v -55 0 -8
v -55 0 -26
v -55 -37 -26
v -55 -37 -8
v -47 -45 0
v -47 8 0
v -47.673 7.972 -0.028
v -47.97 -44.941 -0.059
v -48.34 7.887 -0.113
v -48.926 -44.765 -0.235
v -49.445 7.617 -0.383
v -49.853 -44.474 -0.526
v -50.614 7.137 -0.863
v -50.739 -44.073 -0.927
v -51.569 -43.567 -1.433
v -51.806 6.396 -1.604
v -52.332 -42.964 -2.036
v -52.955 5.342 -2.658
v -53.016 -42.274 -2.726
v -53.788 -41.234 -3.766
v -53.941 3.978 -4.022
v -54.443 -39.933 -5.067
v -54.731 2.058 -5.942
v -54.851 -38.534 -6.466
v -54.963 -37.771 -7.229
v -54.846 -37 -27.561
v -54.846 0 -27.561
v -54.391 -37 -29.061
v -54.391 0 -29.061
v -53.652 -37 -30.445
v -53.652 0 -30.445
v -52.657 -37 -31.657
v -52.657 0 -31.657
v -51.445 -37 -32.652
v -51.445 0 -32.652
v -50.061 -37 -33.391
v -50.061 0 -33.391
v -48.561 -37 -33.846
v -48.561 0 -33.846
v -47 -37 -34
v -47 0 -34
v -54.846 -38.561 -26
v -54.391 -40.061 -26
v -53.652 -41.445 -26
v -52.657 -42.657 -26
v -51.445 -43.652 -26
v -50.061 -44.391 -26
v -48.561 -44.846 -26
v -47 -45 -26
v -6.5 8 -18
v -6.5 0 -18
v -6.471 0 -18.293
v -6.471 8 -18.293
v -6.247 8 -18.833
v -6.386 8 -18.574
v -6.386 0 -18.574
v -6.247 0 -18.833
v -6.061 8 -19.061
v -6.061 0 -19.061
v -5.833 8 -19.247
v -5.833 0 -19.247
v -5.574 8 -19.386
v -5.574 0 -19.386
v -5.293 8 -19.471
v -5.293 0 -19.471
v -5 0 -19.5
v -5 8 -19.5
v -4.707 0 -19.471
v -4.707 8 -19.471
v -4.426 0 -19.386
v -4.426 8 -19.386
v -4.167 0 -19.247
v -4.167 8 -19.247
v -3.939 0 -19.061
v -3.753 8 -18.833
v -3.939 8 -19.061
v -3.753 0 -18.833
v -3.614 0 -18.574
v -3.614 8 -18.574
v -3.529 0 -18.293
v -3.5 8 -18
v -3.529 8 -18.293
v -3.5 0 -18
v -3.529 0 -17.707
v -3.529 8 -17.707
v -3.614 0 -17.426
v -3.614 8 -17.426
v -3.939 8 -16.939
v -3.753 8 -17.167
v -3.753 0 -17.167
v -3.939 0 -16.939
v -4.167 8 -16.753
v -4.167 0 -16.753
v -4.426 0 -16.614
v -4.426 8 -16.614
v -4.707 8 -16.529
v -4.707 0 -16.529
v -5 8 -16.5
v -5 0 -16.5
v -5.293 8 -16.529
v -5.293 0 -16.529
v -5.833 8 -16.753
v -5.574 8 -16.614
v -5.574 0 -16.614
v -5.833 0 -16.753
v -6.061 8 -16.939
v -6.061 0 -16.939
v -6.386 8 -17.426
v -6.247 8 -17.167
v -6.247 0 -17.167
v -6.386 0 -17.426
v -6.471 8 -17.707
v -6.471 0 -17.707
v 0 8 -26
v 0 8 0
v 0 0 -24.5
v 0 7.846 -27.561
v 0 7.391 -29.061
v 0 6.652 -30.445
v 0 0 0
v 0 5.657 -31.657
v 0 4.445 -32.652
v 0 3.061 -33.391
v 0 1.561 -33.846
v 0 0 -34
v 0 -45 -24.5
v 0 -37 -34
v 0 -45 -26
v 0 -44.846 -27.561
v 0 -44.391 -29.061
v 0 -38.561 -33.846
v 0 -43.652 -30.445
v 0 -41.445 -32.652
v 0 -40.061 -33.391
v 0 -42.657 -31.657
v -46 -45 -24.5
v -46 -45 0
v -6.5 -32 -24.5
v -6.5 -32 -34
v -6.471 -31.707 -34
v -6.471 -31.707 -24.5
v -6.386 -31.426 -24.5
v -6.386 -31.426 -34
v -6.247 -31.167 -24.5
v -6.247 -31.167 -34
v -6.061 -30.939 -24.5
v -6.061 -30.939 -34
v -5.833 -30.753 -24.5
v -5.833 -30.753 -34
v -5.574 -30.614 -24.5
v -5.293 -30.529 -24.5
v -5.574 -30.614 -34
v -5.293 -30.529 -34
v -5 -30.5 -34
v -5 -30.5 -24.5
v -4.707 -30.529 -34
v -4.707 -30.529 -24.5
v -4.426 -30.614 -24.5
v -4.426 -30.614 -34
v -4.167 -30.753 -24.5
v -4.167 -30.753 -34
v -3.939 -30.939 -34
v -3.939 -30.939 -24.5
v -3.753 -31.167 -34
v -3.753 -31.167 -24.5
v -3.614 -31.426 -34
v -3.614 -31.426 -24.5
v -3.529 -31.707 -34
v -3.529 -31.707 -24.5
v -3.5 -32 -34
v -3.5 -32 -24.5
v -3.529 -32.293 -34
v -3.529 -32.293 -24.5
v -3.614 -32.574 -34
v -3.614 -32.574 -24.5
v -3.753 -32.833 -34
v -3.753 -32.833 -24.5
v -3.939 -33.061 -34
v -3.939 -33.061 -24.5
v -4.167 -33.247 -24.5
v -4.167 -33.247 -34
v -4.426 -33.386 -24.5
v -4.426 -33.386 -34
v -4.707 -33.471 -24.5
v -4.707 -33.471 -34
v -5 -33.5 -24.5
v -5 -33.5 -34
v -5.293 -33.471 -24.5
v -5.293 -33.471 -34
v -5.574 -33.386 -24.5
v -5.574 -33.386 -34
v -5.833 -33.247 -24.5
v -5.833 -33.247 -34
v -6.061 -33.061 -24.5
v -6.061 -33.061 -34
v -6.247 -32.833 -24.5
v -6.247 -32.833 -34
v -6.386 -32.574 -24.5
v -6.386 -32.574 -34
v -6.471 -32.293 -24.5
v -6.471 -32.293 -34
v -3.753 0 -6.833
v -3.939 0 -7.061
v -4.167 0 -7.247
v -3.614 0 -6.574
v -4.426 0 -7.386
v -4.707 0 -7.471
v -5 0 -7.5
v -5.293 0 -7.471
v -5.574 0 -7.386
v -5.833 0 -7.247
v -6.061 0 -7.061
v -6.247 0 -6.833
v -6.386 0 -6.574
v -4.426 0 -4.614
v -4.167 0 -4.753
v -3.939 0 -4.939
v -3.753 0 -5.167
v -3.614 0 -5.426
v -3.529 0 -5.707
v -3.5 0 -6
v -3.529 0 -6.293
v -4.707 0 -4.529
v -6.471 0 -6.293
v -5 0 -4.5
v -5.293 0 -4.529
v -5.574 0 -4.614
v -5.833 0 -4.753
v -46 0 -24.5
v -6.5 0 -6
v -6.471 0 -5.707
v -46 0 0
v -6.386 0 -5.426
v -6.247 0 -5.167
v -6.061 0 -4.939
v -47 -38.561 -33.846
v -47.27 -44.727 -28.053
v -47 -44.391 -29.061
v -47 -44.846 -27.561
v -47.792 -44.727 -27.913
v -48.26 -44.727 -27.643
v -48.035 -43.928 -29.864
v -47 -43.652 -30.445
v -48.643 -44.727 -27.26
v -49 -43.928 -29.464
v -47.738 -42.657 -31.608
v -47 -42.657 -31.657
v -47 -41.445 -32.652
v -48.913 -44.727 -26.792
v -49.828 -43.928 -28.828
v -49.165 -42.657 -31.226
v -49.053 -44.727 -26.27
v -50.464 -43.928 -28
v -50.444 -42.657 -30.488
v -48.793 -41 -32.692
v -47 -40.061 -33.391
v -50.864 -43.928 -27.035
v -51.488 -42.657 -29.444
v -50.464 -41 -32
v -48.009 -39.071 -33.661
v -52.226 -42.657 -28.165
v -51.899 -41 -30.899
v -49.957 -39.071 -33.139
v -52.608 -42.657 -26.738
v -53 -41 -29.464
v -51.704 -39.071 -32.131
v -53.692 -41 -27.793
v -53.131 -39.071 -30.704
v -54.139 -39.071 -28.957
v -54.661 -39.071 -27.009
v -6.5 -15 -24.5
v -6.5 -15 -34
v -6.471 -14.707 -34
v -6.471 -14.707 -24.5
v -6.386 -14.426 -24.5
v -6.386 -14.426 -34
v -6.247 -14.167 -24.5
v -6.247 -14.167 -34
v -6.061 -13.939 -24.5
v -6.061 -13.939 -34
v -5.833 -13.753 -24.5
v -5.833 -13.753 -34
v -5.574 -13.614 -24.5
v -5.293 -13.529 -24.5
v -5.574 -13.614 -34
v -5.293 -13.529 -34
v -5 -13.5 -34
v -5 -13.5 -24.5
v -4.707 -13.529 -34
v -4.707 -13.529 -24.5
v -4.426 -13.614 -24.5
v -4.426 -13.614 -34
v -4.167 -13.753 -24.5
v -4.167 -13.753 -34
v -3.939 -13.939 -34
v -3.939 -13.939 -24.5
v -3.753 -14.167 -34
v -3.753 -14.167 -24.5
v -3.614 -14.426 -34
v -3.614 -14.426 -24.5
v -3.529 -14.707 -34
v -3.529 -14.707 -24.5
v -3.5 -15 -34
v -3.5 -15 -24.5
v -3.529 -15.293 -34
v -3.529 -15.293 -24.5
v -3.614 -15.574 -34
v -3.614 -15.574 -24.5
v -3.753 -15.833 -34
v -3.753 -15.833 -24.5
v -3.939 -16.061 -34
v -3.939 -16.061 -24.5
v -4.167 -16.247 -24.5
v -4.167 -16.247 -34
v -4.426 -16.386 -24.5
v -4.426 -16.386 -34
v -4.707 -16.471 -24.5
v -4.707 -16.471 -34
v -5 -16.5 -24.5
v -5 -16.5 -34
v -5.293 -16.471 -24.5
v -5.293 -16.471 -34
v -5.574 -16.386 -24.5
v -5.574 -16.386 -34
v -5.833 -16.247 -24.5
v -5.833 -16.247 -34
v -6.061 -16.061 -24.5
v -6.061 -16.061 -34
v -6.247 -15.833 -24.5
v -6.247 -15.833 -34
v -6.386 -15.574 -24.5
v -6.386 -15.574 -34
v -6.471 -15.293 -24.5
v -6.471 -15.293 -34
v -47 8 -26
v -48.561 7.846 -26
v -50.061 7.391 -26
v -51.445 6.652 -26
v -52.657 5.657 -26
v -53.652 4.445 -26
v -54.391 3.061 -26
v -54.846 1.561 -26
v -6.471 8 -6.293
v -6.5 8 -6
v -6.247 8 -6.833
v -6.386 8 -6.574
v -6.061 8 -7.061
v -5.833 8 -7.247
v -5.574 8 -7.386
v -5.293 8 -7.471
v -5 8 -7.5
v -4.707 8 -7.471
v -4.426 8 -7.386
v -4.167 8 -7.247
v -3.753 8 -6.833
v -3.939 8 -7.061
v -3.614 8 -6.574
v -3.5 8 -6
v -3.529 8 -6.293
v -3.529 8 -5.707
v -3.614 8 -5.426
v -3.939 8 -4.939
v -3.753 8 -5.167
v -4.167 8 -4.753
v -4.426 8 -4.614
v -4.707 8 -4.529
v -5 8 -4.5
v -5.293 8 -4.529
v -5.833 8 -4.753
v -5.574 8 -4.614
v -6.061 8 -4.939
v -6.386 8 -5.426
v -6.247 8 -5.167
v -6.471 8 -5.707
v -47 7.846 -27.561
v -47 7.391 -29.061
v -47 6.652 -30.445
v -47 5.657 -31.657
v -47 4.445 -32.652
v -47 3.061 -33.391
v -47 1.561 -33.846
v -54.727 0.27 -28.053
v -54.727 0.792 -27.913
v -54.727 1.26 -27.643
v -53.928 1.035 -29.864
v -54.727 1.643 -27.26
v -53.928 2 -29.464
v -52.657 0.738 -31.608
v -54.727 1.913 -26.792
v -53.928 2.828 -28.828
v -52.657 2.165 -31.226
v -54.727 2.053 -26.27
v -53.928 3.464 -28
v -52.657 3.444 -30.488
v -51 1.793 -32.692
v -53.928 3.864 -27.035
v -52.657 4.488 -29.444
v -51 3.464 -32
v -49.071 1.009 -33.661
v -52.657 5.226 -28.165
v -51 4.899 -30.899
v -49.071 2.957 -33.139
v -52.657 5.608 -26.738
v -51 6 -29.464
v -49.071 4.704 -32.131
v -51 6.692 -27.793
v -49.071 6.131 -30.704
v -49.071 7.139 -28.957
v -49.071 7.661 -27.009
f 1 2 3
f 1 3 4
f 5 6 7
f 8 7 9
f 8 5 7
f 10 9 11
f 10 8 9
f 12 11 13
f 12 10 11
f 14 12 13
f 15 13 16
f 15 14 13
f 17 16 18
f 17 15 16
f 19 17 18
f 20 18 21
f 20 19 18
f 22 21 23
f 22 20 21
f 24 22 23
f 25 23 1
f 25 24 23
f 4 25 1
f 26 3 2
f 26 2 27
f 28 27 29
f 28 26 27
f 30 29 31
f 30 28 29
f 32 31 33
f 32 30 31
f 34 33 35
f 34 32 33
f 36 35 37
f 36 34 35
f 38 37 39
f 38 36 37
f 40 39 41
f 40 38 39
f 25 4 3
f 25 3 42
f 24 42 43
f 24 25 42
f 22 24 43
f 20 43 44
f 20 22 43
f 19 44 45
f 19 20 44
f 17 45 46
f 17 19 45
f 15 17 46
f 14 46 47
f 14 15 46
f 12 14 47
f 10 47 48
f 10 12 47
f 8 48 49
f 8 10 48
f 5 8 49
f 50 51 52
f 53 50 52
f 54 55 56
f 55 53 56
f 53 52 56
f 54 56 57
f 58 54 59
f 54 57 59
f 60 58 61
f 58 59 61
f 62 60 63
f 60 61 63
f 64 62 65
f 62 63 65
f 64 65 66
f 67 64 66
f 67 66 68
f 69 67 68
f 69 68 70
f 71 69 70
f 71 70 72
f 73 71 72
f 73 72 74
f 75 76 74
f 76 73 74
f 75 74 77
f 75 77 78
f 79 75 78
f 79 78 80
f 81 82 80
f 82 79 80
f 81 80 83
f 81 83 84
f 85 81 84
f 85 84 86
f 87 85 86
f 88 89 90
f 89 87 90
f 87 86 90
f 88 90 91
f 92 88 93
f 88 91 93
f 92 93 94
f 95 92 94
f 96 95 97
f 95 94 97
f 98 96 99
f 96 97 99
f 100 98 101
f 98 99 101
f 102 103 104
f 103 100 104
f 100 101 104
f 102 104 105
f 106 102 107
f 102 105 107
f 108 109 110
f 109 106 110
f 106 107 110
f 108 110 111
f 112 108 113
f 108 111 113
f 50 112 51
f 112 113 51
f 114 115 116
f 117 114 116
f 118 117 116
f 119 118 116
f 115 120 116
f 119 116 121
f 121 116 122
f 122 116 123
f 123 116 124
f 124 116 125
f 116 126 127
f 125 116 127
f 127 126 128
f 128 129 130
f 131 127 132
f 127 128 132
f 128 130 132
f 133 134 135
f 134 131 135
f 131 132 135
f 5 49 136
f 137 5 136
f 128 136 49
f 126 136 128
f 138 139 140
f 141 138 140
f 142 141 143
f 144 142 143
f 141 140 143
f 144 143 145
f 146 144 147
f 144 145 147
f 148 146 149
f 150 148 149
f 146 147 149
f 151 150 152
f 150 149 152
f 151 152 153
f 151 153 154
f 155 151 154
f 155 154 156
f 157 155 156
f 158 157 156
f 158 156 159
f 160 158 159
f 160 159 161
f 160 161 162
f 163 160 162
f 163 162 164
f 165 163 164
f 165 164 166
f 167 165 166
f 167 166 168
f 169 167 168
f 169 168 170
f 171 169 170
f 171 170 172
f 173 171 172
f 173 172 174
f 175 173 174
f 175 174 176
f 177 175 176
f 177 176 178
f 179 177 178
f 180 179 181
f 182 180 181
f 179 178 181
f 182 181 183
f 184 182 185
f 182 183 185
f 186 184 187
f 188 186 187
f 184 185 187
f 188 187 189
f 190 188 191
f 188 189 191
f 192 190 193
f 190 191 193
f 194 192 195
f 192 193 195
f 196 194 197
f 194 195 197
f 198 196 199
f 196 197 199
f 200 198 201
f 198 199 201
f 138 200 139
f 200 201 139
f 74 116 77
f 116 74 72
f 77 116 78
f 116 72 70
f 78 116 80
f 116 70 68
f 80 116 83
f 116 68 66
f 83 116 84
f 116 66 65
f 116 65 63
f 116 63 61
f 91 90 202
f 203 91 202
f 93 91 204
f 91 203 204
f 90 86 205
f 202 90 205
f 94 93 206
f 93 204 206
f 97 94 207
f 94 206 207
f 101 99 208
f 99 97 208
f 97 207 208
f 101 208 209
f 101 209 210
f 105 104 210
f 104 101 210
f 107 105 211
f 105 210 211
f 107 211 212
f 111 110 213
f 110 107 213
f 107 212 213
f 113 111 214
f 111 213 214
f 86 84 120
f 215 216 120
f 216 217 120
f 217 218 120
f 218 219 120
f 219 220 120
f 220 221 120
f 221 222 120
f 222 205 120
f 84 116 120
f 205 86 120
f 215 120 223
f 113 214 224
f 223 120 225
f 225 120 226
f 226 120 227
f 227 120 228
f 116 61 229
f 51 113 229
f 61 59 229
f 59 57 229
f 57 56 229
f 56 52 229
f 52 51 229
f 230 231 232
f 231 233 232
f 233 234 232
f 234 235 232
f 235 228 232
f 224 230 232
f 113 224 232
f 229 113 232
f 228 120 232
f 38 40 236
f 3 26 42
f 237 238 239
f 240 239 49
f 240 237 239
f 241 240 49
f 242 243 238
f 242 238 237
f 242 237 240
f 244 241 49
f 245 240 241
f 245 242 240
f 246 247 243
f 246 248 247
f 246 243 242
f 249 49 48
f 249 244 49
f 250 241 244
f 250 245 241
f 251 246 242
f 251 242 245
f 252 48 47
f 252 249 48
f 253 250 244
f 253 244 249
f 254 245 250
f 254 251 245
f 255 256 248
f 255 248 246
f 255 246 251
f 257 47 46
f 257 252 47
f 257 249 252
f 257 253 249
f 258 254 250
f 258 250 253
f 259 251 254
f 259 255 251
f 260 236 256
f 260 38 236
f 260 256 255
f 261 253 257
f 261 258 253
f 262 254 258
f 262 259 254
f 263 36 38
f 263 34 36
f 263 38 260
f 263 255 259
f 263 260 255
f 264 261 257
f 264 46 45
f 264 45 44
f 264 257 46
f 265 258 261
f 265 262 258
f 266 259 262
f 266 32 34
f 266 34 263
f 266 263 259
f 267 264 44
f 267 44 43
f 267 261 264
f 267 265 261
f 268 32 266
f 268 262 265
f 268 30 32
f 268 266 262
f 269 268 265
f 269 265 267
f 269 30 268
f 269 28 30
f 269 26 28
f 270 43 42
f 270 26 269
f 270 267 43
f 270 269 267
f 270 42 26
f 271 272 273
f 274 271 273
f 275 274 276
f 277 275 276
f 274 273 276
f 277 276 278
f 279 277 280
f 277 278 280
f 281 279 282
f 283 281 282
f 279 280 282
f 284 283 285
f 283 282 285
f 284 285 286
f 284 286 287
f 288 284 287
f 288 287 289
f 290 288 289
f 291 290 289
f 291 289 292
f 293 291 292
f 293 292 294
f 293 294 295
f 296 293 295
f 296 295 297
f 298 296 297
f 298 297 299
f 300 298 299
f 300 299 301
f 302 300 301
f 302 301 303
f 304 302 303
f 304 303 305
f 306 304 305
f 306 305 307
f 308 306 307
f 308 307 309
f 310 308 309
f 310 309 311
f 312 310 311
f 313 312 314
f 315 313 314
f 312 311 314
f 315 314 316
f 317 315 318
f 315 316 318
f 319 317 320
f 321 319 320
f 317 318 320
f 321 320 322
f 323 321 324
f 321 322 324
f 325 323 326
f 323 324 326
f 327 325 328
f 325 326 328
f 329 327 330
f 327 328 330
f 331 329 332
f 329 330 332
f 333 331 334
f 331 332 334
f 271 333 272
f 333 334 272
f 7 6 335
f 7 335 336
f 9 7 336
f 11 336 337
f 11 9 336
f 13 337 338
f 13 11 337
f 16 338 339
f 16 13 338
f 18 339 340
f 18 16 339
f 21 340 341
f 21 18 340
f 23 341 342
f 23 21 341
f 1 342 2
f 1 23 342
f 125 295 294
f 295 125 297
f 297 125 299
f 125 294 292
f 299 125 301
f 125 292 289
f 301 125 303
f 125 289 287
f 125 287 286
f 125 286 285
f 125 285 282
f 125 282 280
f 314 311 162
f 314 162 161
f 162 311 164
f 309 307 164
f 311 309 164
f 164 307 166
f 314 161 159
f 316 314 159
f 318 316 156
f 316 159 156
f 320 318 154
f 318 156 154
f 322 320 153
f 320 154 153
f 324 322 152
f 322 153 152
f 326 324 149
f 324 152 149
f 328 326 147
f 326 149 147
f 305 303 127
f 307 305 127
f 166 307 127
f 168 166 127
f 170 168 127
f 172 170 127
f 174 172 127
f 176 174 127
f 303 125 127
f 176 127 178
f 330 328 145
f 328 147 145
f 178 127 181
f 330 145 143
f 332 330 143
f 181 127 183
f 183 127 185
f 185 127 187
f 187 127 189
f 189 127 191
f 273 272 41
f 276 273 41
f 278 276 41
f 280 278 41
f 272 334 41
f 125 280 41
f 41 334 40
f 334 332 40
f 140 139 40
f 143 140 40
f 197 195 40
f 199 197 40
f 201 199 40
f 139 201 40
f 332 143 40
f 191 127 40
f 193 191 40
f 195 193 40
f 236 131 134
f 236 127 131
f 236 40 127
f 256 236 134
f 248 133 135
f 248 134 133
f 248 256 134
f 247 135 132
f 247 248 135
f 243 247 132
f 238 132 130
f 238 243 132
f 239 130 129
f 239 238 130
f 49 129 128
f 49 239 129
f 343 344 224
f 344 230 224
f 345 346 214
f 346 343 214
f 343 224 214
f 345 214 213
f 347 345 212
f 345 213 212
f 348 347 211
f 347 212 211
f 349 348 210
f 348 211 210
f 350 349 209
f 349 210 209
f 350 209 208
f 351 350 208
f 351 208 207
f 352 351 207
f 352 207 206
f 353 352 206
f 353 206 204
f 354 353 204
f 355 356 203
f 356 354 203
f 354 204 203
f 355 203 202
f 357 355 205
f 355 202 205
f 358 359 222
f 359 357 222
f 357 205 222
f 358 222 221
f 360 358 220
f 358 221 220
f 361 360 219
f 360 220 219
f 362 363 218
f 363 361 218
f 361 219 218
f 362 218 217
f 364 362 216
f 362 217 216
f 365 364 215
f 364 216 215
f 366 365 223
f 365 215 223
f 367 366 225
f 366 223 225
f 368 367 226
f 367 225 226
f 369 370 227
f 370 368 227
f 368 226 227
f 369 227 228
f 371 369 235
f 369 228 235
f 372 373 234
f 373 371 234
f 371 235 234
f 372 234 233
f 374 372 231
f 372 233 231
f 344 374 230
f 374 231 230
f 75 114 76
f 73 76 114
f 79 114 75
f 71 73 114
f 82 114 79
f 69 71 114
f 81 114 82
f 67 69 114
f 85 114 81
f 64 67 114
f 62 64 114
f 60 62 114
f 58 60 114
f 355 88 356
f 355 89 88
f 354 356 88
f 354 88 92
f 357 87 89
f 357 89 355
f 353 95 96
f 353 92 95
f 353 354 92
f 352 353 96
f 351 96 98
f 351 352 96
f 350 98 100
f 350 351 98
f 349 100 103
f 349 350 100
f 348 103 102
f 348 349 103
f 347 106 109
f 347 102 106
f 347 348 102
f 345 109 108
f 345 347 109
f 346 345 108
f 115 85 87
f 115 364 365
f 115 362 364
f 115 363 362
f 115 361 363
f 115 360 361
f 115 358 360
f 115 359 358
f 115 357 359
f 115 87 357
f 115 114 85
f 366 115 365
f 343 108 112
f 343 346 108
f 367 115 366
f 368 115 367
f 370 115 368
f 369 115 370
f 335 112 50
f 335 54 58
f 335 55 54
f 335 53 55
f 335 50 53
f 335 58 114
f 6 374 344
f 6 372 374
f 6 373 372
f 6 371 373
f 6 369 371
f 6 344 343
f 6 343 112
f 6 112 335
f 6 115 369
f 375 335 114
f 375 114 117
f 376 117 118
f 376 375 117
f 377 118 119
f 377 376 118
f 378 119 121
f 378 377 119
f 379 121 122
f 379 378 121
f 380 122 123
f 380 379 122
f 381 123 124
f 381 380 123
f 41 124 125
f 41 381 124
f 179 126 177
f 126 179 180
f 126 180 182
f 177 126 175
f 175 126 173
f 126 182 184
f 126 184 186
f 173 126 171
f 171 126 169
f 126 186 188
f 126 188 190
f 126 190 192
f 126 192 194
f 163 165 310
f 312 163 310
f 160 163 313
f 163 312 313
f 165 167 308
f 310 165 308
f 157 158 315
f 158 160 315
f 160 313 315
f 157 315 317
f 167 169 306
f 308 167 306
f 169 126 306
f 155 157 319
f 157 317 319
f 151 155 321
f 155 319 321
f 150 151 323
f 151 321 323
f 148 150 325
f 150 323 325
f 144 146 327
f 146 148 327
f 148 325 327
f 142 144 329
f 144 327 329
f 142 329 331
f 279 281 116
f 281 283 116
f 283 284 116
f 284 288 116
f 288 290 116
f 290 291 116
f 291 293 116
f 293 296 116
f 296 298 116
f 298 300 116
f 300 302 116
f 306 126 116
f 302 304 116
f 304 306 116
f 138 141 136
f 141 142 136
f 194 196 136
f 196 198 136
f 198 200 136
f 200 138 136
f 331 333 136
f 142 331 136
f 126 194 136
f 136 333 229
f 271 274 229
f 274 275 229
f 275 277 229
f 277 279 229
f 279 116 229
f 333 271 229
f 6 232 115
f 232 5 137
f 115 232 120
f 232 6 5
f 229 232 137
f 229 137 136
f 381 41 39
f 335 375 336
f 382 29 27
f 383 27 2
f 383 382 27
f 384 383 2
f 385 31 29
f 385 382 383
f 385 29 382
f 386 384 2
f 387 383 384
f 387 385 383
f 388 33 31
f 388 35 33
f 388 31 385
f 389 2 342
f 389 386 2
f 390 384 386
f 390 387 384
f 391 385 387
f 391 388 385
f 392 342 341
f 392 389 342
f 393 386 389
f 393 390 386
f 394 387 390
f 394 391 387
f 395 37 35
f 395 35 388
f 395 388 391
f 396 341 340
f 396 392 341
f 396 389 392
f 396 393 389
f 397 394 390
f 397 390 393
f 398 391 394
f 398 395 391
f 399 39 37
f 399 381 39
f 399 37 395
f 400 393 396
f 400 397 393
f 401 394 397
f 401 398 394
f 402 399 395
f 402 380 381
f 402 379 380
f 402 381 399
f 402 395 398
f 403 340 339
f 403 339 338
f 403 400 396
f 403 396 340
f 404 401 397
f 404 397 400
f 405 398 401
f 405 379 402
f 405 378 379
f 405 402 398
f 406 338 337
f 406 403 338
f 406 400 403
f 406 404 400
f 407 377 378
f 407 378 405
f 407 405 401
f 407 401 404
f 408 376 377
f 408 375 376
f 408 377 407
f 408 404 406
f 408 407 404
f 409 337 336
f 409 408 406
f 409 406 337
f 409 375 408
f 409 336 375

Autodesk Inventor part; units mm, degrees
ref_plane "YZ Plane" through (0, 0, 0) normal (1, 0, 0) x (0, 1, 0)
ref_plane "XZ Plane" through (0, 0, 0) normal (0, 1, 0) x (-1, 0, 0)
ref_plane "XY Plane" through (0, 0, 0) normal (0, 0, 1) x (1, 0, 0)
sketch "Boceto1" plane through (0, 0, 0) normal (0, 1, 0) x (-1, 0, 0)
  line L0 (0, 0) -> (0, -24)
  line L1 (10, 0) -> (0, 0)
  line L2 (55, -24) -> (55, 0)
  line L3 (55, 0) -> (10, 0)
  line L4 (0, -24) -> (0, -34)
  line L5 (0, -34) -> (55, -34)
  line L6 (55, -34) -> (55, -24)
  line L7 (0, 0) -> (5, 0)
  circle A0 centre (5, -6) radius 1.5
  circle A1 centre (5, -18) radius 1.5
  dimension "d0" = 24
  dimension "d4" = 10
  dimension "d7" = 5
extrude "Extrusión1" add sketch "Boceto1" along normal blind 8
sketch "Boceto2" plane through (0, 0, 0) normal (0, -1, 0) x (1, 0, 0)
  line L0 (0, 0) -> (0, -24.5)
  line L1 (0, 0) -> (0, -34) projected
  line L2 (0, -24.5) -> (-46, -24.5)
  line L3 (-55, -34) -> (-55, 0) projected
  line L4 (-55, -24.5) -> (-55, -34)
  line L5 (0, -34) -> (-55, -34) projected
  line L6 (0, -34) -> (-55, -34)
  line L7 (0, -34) -> (0, -24.5)
  line L8 (-55, 0) -> (0, 0) projected
  line L9 (-55, 0) -> (-46, 0)
  line L10 (-46, 0) -> (-46, -24.5)
  line L11 (-55, -24.5) -> (-55, 0)
  dimension "d15" = 24.5
  dimension "d16" = 9
extrude "Extrusión2" add sketch "Boceto2" along normal blind 45 contours L1 L5 L3 L8 L10 L2
sketch "Boceto3" plane through (0, 8, -34) normal (0, 0, -1) x (-1, 0, 0)
  circle A0 centre (5, -23) radius 1.5
  circle A1 centre (5, -40) radius 1.5
  point P0 (0, -8)
extrude "Extrusión3" cut sketch "Boceto3" against normal blind 45
fillet "Empalme1" radius 8 6 edges at (-27.5, 8, -34) (-55, -18.5, -34) (-55, 8, -17) (-27.5, -45, -34) (-55, -18.5, 0) (-55, -45, -17)
properties part number "Soporte_Brazo_IZQ"
